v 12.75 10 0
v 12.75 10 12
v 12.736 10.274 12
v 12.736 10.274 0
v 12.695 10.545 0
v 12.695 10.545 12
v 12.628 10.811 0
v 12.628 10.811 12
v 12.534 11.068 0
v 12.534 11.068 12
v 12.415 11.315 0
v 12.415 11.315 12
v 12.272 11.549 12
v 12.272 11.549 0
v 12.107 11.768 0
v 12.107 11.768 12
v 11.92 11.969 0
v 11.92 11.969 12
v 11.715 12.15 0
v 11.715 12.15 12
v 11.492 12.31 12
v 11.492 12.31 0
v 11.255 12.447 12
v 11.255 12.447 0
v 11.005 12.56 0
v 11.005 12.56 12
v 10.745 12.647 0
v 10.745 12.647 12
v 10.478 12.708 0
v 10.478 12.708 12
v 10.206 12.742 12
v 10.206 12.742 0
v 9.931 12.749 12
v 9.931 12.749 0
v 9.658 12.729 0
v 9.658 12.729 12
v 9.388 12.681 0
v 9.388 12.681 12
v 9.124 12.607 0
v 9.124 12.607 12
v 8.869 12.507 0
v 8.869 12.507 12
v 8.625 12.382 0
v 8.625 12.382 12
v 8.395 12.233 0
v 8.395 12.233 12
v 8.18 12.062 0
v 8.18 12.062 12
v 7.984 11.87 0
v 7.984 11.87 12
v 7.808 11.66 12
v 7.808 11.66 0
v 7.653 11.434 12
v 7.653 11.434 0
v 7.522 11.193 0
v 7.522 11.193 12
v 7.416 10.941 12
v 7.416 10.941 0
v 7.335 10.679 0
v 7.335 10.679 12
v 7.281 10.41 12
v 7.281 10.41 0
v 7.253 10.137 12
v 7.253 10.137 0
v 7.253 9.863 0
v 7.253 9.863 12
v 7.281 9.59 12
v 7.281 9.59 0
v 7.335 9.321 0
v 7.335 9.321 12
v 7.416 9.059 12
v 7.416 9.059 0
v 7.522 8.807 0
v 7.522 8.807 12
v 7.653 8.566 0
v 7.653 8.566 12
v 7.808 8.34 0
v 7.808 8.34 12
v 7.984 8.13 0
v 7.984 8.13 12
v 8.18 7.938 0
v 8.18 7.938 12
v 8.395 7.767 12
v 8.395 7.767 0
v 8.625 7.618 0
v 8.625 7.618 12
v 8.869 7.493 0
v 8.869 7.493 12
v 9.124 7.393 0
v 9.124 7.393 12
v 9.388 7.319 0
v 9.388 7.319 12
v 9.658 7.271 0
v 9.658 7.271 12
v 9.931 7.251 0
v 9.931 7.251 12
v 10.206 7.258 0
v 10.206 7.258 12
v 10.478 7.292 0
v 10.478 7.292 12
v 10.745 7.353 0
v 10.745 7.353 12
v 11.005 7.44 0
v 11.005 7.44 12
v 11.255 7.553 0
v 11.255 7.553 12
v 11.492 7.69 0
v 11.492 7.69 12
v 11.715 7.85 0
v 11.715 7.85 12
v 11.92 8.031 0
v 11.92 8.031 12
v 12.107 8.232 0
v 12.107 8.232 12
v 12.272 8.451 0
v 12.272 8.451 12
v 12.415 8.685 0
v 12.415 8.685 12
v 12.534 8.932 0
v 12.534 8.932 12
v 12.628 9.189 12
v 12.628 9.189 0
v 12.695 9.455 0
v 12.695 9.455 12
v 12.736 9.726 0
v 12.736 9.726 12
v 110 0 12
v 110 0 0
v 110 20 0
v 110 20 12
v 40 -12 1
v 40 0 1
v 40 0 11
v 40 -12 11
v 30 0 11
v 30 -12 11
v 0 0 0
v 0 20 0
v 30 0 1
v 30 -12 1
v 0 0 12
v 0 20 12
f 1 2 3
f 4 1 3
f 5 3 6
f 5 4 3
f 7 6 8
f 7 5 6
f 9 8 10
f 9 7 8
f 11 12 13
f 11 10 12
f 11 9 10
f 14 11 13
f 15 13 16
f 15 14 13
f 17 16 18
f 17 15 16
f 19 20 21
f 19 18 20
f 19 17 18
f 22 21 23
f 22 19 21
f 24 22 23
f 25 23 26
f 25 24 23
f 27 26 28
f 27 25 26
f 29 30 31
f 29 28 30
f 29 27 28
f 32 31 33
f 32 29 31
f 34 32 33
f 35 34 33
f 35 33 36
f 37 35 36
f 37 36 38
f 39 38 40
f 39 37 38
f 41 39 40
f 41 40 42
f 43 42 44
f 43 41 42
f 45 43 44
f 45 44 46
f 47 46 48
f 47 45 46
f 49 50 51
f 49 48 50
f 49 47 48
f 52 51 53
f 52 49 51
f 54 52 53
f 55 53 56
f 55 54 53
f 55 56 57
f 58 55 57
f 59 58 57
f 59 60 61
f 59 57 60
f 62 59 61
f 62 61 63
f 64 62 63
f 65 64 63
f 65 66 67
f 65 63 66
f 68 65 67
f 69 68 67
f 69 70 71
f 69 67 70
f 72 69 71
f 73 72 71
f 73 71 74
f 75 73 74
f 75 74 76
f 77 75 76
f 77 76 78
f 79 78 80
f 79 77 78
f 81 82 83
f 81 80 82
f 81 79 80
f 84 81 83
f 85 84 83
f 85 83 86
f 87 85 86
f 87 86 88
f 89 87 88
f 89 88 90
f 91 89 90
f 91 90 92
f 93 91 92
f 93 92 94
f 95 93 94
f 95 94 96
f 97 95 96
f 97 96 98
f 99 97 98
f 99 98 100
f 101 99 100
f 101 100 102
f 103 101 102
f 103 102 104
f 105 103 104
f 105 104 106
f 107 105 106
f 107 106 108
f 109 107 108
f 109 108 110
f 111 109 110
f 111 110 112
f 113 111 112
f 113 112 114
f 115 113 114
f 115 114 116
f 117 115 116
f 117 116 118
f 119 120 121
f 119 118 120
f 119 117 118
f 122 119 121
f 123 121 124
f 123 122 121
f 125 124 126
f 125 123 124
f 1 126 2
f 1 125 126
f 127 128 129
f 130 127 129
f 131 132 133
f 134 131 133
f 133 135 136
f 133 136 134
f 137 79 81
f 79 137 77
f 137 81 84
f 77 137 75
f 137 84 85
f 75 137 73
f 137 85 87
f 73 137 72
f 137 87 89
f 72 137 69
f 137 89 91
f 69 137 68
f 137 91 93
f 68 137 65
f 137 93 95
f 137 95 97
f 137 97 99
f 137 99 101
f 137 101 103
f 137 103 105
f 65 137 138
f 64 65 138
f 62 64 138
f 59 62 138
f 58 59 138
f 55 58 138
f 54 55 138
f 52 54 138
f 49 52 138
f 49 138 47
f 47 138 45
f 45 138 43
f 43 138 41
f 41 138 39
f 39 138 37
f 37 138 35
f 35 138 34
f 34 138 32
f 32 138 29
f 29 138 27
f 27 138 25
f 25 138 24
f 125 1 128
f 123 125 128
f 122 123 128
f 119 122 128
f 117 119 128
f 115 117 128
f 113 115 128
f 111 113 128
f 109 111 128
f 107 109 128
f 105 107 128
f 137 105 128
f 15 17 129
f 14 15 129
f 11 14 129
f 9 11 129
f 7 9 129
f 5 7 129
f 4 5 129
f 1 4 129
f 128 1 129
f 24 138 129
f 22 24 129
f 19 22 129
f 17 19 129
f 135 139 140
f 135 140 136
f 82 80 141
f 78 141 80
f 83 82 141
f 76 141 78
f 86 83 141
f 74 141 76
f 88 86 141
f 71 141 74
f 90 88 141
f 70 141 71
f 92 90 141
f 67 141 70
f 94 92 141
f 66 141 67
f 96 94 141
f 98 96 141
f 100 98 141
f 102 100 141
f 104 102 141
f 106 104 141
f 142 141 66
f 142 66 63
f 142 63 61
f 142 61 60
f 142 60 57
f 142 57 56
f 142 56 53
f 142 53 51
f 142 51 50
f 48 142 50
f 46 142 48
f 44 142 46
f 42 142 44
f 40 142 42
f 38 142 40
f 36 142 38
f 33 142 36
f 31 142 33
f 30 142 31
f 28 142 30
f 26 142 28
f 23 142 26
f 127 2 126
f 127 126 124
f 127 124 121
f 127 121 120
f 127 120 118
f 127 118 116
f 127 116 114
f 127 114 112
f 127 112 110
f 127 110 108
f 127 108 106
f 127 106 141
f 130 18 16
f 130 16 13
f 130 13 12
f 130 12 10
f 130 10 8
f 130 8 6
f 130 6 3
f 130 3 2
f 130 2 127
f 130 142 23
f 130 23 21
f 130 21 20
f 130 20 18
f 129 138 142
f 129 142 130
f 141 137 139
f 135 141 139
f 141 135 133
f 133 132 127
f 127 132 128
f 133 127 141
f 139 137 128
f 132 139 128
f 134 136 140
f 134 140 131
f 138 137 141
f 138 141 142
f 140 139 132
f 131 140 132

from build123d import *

# Parameters (mm, degrees)
SKETCH1_W               = 110
SKETCH1_H               = 20
BOSS_EXTRUDE1_DEPTH     = 12
CUT_EXTRUDE1_DEPTH      = 113.445542375
CUT_EXTRUDE1_DEPTH_BACK = 113.445542375
SKETCH2_R               = 2.75
SKETCH3_W               = 10
SKETCH3_H               = 10
BOSS_EXTRUDE2_DEPTH     = 12


with BuildPart() as part:
    # Sketch1 → Boss-Extrude1 (new body)
    with BuildSketch(Plane.XY):
        with Locations((55, 10)):
            Rectangle(SKETCH1_W, SKETCH1_H)
    extrude(amount=BOSS_EXTRUDE1_DEPTH)

    # Sketch2 → Cut-Extrude1 (cut, two sides: drawn at the far end of the back side and taken through both)
    with BuildSketch(Plane.XY.offset(12).offset(-CUT_EXTRUDE1_DEPTH_BACK)):
        with Locations((10, 10)):
            Circle(SKETCH2_R)
    extrude(amount=CUT_EXTRUDE1_DEPTH + CUT_EXTRUDE1_DEPTH_BACK, mode=Mode.SUBTRACT)

    # Sketch3 → Boss-Extrude2 (add)
    with BuildSketch(Plane.XZ):
        with Locations((35, 6)):
            Rectangle(SKETCH3_W, SKETCH3_H)
    extrude(amount=BOSS_EXTRUDE2_DEPTH)


solid = part.part
